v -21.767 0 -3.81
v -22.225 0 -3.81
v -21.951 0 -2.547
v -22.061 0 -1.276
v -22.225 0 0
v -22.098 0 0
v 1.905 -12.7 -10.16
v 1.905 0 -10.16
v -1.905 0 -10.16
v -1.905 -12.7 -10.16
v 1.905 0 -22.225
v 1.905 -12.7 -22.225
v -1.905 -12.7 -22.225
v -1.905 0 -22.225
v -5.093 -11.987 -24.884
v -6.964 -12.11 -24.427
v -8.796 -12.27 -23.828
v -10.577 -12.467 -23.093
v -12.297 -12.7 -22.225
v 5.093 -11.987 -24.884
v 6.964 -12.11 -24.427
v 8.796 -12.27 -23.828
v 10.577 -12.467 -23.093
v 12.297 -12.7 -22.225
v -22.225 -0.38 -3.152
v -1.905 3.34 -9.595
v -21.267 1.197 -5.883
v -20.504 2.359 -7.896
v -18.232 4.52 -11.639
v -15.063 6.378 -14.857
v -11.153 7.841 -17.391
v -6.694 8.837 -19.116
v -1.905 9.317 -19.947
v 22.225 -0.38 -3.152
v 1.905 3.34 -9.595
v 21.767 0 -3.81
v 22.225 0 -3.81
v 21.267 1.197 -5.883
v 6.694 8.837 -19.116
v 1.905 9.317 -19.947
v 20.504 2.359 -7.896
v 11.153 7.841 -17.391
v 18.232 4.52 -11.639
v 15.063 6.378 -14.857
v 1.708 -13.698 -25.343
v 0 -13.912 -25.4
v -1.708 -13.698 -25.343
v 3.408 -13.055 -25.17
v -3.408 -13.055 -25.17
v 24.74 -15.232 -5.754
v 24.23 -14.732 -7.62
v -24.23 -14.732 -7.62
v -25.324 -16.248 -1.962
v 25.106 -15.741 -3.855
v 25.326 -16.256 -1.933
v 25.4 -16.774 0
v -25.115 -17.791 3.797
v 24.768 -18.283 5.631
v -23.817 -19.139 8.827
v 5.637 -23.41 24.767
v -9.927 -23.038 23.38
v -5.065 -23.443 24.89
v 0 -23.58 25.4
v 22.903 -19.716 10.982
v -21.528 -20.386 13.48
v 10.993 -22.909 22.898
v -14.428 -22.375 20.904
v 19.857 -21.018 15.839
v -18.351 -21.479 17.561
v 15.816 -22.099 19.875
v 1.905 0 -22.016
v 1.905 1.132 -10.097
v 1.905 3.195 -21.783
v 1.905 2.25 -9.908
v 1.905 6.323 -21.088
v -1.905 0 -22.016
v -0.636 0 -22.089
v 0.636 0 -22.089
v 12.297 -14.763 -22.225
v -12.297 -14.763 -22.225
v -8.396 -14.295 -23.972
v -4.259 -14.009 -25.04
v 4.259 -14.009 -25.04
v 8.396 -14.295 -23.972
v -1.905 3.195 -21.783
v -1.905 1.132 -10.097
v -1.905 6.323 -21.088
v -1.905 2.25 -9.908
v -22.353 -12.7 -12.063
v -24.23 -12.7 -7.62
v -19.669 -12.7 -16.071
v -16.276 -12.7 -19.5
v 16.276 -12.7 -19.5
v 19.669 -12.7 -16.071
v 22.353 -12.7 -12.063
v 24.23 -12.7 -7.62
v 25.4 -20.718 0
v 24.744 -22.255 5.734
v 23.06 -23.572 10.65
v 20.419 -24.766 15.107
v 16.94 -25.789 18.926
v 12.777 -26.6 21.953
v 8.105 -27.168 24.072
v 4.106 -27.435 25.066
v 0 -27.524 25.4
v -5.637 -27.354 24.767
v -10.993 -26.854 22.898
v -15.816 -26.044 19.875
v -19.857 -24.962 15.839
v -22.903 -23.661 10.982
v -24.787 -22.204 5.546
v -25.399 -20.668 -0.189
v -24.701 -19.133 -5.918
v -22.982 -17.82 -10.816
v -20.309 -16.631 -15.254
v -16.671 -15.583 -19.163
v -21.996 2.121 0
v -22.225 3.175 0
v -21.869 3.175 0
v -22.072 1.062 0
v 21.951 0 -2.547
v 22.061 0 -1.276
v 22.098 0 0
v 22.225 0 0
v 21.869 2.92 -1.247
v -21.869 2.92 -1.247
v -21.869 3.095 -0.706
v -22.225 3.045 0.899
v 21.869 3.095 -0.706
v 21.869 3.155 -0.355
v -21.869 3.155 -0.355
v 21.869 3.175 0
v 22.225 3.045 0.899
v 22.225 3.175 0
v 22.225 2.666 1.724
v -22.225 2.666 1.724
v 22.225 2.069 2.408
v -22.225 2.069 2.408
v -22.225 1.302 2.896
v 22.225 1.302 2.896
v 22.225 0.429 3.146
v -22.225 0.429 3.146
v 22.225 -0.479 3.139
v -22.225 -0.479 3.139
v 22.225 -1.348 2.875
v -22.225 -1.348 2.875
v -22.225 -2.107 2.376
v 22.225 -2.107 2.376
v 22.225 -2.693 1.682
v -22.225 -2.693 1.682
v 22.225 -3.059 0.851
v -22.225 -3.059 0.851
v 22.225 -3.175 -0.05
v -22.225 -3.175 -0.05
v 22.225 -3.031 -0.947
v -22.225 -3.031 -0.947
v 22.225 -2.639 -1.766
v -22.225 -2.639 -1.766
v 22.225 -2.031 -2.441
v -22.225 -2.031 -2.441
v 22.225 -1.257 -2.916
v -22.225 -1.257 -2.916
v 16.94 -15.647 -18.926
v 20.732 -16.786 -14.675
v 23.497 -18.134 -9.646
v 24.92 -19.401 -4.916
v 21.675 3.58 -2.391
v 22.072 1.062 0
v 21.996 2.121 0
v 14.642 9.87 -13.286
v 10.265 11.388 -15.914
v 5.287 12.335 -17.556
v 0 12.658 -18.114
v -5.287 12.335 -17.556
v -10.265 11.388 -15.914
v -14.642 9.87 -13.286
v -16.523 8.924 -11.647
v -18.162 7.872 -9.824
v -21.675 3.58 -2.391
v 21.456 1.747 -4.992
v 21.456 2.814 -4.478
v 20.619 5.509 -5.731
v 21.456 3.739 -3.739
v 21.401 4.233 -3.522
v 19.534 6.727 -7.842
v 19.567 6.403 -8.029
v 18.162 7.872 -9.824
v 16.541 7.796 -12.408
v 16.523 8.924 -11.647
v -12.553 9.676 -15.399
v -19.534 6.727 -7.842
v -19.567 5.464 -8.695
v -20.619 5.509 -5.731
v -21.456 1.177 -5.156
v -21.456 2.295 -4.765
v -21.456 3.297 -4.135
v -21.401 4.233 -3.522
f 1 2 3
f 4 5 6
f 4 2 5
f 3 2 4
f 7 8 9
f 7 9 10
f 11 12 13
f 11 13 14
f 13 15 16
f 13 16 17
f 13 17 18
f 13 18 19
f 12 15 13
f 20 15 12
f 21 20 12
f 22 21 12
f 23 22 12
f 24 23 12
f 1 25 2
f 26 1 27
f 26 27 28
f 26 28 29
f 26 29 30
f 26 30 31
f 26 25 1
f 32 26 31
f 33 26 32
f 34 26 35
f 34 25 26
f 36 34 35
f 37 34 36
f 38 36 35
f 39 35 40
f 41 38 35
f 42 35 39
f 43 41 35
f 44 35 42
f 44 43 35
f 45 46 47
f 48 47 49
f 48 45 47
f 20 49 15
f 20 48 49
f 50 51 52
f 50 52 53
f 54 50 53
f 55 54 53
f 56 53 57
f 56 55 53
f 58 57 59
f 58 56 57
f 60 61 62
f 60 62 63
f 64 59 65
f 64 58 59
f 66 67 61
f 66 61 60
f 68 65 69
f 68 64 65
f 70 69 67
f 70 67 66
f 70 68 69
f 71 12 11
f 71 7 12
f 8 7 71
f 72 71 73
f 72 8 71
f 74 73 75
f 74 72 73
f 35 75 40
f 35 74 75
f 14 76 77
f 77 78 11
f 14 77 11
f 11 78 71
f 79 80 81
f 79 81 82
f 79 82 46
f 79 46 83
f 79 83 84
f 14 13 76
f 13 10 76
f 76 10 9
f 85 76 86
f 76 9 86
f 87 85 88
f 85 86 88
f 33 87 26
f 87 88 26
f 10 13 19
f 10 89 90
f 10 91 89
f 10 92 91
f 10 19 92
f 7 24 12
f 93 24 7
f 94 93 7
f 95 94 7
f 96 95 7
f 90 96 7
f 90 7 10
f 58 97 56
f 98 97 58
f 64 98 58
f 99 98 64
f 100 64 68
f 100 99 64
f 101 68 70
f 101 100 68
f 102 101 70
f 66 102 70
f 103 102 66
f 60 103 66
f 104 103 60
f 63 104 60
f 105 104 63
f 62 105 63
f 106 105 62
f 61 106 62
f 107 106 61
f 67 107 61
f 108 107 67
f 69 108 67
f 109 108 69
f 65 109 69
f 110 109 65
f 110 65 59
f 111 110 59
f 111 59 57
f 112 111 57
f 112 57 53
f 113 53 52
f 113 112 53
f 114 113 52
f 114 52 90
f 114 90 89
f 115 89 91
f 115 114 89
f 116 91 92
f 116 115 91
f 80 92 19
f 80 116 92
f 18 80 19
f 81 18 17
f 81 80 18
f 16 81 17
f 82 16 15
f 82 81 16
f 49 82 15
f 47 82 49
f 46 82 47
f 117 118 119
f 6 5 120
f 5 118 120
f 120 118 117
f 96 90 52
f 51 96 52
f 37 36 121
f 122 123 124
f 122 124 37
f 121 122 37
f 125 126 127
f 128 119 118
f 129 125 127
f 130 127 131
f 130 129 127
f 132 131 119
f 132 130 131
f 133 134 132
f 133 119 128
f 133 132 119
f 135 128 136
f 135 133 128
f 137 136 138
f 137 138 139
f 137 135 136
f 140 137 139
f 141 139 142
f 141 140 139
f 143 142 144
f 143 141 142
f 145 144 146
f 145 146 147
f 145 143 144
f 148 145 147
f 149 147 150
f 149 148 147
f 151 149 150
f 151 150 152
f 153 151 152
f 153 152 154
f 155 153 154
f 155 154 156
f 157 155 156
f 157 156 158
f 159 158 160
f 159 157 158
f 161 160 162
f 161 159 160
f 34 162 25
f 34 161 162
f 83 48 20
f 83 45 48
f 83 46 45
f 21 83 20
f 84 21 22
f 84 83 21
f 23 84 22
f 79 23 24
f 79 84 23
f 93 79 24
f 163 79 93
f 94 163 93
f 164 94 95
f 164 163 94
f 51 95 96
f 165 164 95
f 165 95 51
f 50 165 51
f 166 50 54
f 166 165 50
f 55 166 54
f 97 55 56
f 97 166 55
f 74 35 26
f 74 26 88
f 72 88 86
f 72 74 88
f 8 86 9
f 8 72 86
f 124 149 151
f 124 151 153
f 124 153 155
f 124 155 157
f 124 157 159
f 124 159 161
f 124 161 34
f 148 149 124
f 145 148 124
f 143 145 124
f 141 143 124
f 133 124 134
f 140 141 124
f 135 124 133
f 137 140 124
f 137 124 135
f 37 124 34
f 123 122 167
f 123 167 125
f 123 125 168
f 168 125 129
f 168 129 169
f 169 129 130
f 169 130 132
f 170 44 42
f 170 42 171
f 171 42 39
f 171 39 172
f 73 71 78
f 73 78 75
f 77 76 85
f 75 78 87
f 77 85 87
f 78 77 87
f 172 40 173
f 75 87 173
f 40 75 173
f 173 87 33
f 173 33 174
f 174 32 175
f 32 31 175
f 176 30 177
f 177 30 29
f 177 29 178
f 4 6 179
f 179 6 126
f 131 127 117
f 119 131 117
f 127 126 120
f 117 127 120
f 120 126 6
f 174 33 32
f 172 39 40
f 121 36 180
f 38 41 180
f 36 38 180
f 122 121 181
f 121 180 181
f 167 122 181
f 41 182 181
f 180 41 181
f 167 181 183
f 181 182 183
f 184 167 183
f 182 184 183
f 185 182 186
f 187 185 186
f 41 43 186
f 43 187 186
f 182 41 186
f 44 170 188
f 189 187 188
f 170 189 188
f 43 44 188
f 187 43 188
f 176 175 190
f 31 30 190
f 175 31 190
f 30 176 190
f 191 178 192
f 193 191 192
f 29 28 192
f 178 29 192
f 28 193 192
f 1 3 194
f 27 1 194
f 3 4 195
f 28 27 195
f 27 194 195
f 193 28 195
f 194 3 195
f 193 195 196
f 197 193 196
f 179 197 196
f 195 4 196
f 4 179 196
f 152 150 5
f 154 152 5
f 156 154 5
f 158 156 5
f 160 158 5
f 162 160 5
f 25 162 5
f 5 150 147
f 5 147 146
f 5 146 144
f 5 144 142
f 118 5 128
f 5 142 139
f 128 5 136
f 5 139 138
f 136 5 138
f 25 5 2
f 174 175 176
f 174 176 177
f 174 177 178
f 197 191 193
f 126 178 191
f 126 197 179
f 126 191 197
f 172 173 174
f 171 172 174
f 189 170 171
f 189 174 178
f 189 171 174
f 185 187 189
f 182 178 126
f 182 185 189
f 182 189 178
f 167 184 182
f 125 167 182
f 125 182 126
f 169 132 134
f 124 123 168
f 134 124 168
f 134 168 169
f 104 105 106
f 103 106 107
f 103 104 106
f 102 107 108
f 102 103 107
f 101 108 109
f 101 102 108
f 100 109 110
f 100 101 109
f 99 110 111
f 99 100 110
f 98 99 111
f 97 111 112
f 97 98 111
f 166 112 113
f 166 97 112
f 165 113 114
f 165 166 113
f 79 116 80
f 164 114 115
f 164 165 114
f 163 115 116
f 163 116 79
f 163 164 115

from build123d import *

# Parameters (mm, degrees)
F1_DEPTH  = 22.225
F3_DEPTH  = 1.905
F5_DEPTH  = 38.1
F7_ANGLE  = 90
F9_DEPTH  = 31.75
F11_START = 27.5250845814
F10_R     = 25.4
F11_DEPTH = 40.1837304781


with BuildPart() as f1:
    # F0 (on Right) → F1 (new body, symmetric)
    with BuildSketch(Plane.YZ):
        with BuildLine():
            ThreePointArc((2.9197783942, -1.2472045256), (3.1105402587, -0.6365251756), (3.175, 0))
            ThreePointArc((3.175, 0), (-2.1065171016, 2.3755442957), (-0.3797783942, -3.1522045256))
            ThreePointArc((-0.3797783942, -3.1522045256), (1.5875, -2.749630657), (2.9197783942, -1.2472045256))
        make_face()
        with BuildLine():
            ThreePointArc((2.9197783942, -1.2472045256), (1.5875, -2.749630657), (-0.3797783942, -3.1522045256))
            Line((-0.3797783942, -3.1522045256), (25.0202216058, -47.1462950379))
            Line((25.0202216058, -47.1462950379), (28.3197783942, -45.2412950379))
            Line((28.3197783942, -45.2412950379), (2.9197783942, -1.2472045256))
        make_face()
    extrude(amount=F1_DEPTH, both=True)

    # F2 (on Right) → F3 (join, symmetric)
    with BuildSketch(Plane.YZ):
        with BuildLine():
            Line((26.4980818491, -46.2930520286), (4.9071120764, -8.8963953976))
            ThreePointArc((4.9071120764, -8.8963953976), (2.5335965307, -9.8390288453), (0, -10.16))
            Line((0, -10.16), (-12.7, -10.16))
            Line((-12.7, -10.16), (-12.7, -53.3403694007))
            Line((-12.7, -53.3403694007), (0, -53.3403694007))
            ThreePointArc((0, -53.3403694007), (13.7096045149, -51.5484408285), (26.4980818491, -46.2930520286))
        make_face()
    extrude(amount=F3_DEPTH, both=True)

    # F4 (on Right) → F5 (intersect, symmetric)
    with BuildSketch(Plane.YZ):
        with BuildLine():
            Line((-12.7, -22.225), (0, -22.225))
            ThreePointArc((0, -22.225), (21.2050948807, 6.6554170492), (-12.7, 18.2389864028))
            Line((-12.7, 18.2389864028), (-12.7, -22.225))
        make_face()
    extrude(amount=F5_DEPTH, both=True, mode=Mode.INTERSECT)

    # F6 (on Front) → F7 (revolve, cut)
    with BuildSketch(Plane.XZ):
        with BuildLine():
            Line((29.537089169, 0), (22.098, 0))
            ThreePointArc((22.098, 0), (0, -22.098), (-22.098, 0))
            Line((-22.098, 0), (-30.2814375609, 0))
            Line((-30.2814375609, 0), (-30.2814375609, -27.1878223866))
            Line((-30.2814375609, -27.1878223866), (29.537089169, -27.1878223866))
            Line((29.537089169, -27.1878223866), (29.537089169, 0))
        make_face()
    revolve(axis=Axis((11.049, 0, 0), (1, 0, 0)), revolution_arc=F7_ANGLE, mode=Mode.SUBTRACT)

    # F8 (on Right) → F9 (join, symmetric)
    with BuildSketch(Plane.YZ):
        Polygon((-23.5796823341, 25.4), (-27.5240845814, 25.4), (-14.7630042919, -22.225), (-12.7, -22.225), (-12.7, -7.62), (-14.732, -7.62), align=None)
        Polygon((-12.7, -22.225), (-14.7630042919, -22.225), (-13.9122656059, -25.4), (-11.9874563975, -24.884248927), align=None)
    extrude(amount=F9_DEPTH, both=True)

    # F10 (on Front) → F11 (intersect)
    with BuildSketch(Plane.XZ.offset(F11_START)):
        Circle(F10_R)
    extrude(amount=-F11_DEPTH, mode=Mode.INTERSECT)


solid = f1.part
